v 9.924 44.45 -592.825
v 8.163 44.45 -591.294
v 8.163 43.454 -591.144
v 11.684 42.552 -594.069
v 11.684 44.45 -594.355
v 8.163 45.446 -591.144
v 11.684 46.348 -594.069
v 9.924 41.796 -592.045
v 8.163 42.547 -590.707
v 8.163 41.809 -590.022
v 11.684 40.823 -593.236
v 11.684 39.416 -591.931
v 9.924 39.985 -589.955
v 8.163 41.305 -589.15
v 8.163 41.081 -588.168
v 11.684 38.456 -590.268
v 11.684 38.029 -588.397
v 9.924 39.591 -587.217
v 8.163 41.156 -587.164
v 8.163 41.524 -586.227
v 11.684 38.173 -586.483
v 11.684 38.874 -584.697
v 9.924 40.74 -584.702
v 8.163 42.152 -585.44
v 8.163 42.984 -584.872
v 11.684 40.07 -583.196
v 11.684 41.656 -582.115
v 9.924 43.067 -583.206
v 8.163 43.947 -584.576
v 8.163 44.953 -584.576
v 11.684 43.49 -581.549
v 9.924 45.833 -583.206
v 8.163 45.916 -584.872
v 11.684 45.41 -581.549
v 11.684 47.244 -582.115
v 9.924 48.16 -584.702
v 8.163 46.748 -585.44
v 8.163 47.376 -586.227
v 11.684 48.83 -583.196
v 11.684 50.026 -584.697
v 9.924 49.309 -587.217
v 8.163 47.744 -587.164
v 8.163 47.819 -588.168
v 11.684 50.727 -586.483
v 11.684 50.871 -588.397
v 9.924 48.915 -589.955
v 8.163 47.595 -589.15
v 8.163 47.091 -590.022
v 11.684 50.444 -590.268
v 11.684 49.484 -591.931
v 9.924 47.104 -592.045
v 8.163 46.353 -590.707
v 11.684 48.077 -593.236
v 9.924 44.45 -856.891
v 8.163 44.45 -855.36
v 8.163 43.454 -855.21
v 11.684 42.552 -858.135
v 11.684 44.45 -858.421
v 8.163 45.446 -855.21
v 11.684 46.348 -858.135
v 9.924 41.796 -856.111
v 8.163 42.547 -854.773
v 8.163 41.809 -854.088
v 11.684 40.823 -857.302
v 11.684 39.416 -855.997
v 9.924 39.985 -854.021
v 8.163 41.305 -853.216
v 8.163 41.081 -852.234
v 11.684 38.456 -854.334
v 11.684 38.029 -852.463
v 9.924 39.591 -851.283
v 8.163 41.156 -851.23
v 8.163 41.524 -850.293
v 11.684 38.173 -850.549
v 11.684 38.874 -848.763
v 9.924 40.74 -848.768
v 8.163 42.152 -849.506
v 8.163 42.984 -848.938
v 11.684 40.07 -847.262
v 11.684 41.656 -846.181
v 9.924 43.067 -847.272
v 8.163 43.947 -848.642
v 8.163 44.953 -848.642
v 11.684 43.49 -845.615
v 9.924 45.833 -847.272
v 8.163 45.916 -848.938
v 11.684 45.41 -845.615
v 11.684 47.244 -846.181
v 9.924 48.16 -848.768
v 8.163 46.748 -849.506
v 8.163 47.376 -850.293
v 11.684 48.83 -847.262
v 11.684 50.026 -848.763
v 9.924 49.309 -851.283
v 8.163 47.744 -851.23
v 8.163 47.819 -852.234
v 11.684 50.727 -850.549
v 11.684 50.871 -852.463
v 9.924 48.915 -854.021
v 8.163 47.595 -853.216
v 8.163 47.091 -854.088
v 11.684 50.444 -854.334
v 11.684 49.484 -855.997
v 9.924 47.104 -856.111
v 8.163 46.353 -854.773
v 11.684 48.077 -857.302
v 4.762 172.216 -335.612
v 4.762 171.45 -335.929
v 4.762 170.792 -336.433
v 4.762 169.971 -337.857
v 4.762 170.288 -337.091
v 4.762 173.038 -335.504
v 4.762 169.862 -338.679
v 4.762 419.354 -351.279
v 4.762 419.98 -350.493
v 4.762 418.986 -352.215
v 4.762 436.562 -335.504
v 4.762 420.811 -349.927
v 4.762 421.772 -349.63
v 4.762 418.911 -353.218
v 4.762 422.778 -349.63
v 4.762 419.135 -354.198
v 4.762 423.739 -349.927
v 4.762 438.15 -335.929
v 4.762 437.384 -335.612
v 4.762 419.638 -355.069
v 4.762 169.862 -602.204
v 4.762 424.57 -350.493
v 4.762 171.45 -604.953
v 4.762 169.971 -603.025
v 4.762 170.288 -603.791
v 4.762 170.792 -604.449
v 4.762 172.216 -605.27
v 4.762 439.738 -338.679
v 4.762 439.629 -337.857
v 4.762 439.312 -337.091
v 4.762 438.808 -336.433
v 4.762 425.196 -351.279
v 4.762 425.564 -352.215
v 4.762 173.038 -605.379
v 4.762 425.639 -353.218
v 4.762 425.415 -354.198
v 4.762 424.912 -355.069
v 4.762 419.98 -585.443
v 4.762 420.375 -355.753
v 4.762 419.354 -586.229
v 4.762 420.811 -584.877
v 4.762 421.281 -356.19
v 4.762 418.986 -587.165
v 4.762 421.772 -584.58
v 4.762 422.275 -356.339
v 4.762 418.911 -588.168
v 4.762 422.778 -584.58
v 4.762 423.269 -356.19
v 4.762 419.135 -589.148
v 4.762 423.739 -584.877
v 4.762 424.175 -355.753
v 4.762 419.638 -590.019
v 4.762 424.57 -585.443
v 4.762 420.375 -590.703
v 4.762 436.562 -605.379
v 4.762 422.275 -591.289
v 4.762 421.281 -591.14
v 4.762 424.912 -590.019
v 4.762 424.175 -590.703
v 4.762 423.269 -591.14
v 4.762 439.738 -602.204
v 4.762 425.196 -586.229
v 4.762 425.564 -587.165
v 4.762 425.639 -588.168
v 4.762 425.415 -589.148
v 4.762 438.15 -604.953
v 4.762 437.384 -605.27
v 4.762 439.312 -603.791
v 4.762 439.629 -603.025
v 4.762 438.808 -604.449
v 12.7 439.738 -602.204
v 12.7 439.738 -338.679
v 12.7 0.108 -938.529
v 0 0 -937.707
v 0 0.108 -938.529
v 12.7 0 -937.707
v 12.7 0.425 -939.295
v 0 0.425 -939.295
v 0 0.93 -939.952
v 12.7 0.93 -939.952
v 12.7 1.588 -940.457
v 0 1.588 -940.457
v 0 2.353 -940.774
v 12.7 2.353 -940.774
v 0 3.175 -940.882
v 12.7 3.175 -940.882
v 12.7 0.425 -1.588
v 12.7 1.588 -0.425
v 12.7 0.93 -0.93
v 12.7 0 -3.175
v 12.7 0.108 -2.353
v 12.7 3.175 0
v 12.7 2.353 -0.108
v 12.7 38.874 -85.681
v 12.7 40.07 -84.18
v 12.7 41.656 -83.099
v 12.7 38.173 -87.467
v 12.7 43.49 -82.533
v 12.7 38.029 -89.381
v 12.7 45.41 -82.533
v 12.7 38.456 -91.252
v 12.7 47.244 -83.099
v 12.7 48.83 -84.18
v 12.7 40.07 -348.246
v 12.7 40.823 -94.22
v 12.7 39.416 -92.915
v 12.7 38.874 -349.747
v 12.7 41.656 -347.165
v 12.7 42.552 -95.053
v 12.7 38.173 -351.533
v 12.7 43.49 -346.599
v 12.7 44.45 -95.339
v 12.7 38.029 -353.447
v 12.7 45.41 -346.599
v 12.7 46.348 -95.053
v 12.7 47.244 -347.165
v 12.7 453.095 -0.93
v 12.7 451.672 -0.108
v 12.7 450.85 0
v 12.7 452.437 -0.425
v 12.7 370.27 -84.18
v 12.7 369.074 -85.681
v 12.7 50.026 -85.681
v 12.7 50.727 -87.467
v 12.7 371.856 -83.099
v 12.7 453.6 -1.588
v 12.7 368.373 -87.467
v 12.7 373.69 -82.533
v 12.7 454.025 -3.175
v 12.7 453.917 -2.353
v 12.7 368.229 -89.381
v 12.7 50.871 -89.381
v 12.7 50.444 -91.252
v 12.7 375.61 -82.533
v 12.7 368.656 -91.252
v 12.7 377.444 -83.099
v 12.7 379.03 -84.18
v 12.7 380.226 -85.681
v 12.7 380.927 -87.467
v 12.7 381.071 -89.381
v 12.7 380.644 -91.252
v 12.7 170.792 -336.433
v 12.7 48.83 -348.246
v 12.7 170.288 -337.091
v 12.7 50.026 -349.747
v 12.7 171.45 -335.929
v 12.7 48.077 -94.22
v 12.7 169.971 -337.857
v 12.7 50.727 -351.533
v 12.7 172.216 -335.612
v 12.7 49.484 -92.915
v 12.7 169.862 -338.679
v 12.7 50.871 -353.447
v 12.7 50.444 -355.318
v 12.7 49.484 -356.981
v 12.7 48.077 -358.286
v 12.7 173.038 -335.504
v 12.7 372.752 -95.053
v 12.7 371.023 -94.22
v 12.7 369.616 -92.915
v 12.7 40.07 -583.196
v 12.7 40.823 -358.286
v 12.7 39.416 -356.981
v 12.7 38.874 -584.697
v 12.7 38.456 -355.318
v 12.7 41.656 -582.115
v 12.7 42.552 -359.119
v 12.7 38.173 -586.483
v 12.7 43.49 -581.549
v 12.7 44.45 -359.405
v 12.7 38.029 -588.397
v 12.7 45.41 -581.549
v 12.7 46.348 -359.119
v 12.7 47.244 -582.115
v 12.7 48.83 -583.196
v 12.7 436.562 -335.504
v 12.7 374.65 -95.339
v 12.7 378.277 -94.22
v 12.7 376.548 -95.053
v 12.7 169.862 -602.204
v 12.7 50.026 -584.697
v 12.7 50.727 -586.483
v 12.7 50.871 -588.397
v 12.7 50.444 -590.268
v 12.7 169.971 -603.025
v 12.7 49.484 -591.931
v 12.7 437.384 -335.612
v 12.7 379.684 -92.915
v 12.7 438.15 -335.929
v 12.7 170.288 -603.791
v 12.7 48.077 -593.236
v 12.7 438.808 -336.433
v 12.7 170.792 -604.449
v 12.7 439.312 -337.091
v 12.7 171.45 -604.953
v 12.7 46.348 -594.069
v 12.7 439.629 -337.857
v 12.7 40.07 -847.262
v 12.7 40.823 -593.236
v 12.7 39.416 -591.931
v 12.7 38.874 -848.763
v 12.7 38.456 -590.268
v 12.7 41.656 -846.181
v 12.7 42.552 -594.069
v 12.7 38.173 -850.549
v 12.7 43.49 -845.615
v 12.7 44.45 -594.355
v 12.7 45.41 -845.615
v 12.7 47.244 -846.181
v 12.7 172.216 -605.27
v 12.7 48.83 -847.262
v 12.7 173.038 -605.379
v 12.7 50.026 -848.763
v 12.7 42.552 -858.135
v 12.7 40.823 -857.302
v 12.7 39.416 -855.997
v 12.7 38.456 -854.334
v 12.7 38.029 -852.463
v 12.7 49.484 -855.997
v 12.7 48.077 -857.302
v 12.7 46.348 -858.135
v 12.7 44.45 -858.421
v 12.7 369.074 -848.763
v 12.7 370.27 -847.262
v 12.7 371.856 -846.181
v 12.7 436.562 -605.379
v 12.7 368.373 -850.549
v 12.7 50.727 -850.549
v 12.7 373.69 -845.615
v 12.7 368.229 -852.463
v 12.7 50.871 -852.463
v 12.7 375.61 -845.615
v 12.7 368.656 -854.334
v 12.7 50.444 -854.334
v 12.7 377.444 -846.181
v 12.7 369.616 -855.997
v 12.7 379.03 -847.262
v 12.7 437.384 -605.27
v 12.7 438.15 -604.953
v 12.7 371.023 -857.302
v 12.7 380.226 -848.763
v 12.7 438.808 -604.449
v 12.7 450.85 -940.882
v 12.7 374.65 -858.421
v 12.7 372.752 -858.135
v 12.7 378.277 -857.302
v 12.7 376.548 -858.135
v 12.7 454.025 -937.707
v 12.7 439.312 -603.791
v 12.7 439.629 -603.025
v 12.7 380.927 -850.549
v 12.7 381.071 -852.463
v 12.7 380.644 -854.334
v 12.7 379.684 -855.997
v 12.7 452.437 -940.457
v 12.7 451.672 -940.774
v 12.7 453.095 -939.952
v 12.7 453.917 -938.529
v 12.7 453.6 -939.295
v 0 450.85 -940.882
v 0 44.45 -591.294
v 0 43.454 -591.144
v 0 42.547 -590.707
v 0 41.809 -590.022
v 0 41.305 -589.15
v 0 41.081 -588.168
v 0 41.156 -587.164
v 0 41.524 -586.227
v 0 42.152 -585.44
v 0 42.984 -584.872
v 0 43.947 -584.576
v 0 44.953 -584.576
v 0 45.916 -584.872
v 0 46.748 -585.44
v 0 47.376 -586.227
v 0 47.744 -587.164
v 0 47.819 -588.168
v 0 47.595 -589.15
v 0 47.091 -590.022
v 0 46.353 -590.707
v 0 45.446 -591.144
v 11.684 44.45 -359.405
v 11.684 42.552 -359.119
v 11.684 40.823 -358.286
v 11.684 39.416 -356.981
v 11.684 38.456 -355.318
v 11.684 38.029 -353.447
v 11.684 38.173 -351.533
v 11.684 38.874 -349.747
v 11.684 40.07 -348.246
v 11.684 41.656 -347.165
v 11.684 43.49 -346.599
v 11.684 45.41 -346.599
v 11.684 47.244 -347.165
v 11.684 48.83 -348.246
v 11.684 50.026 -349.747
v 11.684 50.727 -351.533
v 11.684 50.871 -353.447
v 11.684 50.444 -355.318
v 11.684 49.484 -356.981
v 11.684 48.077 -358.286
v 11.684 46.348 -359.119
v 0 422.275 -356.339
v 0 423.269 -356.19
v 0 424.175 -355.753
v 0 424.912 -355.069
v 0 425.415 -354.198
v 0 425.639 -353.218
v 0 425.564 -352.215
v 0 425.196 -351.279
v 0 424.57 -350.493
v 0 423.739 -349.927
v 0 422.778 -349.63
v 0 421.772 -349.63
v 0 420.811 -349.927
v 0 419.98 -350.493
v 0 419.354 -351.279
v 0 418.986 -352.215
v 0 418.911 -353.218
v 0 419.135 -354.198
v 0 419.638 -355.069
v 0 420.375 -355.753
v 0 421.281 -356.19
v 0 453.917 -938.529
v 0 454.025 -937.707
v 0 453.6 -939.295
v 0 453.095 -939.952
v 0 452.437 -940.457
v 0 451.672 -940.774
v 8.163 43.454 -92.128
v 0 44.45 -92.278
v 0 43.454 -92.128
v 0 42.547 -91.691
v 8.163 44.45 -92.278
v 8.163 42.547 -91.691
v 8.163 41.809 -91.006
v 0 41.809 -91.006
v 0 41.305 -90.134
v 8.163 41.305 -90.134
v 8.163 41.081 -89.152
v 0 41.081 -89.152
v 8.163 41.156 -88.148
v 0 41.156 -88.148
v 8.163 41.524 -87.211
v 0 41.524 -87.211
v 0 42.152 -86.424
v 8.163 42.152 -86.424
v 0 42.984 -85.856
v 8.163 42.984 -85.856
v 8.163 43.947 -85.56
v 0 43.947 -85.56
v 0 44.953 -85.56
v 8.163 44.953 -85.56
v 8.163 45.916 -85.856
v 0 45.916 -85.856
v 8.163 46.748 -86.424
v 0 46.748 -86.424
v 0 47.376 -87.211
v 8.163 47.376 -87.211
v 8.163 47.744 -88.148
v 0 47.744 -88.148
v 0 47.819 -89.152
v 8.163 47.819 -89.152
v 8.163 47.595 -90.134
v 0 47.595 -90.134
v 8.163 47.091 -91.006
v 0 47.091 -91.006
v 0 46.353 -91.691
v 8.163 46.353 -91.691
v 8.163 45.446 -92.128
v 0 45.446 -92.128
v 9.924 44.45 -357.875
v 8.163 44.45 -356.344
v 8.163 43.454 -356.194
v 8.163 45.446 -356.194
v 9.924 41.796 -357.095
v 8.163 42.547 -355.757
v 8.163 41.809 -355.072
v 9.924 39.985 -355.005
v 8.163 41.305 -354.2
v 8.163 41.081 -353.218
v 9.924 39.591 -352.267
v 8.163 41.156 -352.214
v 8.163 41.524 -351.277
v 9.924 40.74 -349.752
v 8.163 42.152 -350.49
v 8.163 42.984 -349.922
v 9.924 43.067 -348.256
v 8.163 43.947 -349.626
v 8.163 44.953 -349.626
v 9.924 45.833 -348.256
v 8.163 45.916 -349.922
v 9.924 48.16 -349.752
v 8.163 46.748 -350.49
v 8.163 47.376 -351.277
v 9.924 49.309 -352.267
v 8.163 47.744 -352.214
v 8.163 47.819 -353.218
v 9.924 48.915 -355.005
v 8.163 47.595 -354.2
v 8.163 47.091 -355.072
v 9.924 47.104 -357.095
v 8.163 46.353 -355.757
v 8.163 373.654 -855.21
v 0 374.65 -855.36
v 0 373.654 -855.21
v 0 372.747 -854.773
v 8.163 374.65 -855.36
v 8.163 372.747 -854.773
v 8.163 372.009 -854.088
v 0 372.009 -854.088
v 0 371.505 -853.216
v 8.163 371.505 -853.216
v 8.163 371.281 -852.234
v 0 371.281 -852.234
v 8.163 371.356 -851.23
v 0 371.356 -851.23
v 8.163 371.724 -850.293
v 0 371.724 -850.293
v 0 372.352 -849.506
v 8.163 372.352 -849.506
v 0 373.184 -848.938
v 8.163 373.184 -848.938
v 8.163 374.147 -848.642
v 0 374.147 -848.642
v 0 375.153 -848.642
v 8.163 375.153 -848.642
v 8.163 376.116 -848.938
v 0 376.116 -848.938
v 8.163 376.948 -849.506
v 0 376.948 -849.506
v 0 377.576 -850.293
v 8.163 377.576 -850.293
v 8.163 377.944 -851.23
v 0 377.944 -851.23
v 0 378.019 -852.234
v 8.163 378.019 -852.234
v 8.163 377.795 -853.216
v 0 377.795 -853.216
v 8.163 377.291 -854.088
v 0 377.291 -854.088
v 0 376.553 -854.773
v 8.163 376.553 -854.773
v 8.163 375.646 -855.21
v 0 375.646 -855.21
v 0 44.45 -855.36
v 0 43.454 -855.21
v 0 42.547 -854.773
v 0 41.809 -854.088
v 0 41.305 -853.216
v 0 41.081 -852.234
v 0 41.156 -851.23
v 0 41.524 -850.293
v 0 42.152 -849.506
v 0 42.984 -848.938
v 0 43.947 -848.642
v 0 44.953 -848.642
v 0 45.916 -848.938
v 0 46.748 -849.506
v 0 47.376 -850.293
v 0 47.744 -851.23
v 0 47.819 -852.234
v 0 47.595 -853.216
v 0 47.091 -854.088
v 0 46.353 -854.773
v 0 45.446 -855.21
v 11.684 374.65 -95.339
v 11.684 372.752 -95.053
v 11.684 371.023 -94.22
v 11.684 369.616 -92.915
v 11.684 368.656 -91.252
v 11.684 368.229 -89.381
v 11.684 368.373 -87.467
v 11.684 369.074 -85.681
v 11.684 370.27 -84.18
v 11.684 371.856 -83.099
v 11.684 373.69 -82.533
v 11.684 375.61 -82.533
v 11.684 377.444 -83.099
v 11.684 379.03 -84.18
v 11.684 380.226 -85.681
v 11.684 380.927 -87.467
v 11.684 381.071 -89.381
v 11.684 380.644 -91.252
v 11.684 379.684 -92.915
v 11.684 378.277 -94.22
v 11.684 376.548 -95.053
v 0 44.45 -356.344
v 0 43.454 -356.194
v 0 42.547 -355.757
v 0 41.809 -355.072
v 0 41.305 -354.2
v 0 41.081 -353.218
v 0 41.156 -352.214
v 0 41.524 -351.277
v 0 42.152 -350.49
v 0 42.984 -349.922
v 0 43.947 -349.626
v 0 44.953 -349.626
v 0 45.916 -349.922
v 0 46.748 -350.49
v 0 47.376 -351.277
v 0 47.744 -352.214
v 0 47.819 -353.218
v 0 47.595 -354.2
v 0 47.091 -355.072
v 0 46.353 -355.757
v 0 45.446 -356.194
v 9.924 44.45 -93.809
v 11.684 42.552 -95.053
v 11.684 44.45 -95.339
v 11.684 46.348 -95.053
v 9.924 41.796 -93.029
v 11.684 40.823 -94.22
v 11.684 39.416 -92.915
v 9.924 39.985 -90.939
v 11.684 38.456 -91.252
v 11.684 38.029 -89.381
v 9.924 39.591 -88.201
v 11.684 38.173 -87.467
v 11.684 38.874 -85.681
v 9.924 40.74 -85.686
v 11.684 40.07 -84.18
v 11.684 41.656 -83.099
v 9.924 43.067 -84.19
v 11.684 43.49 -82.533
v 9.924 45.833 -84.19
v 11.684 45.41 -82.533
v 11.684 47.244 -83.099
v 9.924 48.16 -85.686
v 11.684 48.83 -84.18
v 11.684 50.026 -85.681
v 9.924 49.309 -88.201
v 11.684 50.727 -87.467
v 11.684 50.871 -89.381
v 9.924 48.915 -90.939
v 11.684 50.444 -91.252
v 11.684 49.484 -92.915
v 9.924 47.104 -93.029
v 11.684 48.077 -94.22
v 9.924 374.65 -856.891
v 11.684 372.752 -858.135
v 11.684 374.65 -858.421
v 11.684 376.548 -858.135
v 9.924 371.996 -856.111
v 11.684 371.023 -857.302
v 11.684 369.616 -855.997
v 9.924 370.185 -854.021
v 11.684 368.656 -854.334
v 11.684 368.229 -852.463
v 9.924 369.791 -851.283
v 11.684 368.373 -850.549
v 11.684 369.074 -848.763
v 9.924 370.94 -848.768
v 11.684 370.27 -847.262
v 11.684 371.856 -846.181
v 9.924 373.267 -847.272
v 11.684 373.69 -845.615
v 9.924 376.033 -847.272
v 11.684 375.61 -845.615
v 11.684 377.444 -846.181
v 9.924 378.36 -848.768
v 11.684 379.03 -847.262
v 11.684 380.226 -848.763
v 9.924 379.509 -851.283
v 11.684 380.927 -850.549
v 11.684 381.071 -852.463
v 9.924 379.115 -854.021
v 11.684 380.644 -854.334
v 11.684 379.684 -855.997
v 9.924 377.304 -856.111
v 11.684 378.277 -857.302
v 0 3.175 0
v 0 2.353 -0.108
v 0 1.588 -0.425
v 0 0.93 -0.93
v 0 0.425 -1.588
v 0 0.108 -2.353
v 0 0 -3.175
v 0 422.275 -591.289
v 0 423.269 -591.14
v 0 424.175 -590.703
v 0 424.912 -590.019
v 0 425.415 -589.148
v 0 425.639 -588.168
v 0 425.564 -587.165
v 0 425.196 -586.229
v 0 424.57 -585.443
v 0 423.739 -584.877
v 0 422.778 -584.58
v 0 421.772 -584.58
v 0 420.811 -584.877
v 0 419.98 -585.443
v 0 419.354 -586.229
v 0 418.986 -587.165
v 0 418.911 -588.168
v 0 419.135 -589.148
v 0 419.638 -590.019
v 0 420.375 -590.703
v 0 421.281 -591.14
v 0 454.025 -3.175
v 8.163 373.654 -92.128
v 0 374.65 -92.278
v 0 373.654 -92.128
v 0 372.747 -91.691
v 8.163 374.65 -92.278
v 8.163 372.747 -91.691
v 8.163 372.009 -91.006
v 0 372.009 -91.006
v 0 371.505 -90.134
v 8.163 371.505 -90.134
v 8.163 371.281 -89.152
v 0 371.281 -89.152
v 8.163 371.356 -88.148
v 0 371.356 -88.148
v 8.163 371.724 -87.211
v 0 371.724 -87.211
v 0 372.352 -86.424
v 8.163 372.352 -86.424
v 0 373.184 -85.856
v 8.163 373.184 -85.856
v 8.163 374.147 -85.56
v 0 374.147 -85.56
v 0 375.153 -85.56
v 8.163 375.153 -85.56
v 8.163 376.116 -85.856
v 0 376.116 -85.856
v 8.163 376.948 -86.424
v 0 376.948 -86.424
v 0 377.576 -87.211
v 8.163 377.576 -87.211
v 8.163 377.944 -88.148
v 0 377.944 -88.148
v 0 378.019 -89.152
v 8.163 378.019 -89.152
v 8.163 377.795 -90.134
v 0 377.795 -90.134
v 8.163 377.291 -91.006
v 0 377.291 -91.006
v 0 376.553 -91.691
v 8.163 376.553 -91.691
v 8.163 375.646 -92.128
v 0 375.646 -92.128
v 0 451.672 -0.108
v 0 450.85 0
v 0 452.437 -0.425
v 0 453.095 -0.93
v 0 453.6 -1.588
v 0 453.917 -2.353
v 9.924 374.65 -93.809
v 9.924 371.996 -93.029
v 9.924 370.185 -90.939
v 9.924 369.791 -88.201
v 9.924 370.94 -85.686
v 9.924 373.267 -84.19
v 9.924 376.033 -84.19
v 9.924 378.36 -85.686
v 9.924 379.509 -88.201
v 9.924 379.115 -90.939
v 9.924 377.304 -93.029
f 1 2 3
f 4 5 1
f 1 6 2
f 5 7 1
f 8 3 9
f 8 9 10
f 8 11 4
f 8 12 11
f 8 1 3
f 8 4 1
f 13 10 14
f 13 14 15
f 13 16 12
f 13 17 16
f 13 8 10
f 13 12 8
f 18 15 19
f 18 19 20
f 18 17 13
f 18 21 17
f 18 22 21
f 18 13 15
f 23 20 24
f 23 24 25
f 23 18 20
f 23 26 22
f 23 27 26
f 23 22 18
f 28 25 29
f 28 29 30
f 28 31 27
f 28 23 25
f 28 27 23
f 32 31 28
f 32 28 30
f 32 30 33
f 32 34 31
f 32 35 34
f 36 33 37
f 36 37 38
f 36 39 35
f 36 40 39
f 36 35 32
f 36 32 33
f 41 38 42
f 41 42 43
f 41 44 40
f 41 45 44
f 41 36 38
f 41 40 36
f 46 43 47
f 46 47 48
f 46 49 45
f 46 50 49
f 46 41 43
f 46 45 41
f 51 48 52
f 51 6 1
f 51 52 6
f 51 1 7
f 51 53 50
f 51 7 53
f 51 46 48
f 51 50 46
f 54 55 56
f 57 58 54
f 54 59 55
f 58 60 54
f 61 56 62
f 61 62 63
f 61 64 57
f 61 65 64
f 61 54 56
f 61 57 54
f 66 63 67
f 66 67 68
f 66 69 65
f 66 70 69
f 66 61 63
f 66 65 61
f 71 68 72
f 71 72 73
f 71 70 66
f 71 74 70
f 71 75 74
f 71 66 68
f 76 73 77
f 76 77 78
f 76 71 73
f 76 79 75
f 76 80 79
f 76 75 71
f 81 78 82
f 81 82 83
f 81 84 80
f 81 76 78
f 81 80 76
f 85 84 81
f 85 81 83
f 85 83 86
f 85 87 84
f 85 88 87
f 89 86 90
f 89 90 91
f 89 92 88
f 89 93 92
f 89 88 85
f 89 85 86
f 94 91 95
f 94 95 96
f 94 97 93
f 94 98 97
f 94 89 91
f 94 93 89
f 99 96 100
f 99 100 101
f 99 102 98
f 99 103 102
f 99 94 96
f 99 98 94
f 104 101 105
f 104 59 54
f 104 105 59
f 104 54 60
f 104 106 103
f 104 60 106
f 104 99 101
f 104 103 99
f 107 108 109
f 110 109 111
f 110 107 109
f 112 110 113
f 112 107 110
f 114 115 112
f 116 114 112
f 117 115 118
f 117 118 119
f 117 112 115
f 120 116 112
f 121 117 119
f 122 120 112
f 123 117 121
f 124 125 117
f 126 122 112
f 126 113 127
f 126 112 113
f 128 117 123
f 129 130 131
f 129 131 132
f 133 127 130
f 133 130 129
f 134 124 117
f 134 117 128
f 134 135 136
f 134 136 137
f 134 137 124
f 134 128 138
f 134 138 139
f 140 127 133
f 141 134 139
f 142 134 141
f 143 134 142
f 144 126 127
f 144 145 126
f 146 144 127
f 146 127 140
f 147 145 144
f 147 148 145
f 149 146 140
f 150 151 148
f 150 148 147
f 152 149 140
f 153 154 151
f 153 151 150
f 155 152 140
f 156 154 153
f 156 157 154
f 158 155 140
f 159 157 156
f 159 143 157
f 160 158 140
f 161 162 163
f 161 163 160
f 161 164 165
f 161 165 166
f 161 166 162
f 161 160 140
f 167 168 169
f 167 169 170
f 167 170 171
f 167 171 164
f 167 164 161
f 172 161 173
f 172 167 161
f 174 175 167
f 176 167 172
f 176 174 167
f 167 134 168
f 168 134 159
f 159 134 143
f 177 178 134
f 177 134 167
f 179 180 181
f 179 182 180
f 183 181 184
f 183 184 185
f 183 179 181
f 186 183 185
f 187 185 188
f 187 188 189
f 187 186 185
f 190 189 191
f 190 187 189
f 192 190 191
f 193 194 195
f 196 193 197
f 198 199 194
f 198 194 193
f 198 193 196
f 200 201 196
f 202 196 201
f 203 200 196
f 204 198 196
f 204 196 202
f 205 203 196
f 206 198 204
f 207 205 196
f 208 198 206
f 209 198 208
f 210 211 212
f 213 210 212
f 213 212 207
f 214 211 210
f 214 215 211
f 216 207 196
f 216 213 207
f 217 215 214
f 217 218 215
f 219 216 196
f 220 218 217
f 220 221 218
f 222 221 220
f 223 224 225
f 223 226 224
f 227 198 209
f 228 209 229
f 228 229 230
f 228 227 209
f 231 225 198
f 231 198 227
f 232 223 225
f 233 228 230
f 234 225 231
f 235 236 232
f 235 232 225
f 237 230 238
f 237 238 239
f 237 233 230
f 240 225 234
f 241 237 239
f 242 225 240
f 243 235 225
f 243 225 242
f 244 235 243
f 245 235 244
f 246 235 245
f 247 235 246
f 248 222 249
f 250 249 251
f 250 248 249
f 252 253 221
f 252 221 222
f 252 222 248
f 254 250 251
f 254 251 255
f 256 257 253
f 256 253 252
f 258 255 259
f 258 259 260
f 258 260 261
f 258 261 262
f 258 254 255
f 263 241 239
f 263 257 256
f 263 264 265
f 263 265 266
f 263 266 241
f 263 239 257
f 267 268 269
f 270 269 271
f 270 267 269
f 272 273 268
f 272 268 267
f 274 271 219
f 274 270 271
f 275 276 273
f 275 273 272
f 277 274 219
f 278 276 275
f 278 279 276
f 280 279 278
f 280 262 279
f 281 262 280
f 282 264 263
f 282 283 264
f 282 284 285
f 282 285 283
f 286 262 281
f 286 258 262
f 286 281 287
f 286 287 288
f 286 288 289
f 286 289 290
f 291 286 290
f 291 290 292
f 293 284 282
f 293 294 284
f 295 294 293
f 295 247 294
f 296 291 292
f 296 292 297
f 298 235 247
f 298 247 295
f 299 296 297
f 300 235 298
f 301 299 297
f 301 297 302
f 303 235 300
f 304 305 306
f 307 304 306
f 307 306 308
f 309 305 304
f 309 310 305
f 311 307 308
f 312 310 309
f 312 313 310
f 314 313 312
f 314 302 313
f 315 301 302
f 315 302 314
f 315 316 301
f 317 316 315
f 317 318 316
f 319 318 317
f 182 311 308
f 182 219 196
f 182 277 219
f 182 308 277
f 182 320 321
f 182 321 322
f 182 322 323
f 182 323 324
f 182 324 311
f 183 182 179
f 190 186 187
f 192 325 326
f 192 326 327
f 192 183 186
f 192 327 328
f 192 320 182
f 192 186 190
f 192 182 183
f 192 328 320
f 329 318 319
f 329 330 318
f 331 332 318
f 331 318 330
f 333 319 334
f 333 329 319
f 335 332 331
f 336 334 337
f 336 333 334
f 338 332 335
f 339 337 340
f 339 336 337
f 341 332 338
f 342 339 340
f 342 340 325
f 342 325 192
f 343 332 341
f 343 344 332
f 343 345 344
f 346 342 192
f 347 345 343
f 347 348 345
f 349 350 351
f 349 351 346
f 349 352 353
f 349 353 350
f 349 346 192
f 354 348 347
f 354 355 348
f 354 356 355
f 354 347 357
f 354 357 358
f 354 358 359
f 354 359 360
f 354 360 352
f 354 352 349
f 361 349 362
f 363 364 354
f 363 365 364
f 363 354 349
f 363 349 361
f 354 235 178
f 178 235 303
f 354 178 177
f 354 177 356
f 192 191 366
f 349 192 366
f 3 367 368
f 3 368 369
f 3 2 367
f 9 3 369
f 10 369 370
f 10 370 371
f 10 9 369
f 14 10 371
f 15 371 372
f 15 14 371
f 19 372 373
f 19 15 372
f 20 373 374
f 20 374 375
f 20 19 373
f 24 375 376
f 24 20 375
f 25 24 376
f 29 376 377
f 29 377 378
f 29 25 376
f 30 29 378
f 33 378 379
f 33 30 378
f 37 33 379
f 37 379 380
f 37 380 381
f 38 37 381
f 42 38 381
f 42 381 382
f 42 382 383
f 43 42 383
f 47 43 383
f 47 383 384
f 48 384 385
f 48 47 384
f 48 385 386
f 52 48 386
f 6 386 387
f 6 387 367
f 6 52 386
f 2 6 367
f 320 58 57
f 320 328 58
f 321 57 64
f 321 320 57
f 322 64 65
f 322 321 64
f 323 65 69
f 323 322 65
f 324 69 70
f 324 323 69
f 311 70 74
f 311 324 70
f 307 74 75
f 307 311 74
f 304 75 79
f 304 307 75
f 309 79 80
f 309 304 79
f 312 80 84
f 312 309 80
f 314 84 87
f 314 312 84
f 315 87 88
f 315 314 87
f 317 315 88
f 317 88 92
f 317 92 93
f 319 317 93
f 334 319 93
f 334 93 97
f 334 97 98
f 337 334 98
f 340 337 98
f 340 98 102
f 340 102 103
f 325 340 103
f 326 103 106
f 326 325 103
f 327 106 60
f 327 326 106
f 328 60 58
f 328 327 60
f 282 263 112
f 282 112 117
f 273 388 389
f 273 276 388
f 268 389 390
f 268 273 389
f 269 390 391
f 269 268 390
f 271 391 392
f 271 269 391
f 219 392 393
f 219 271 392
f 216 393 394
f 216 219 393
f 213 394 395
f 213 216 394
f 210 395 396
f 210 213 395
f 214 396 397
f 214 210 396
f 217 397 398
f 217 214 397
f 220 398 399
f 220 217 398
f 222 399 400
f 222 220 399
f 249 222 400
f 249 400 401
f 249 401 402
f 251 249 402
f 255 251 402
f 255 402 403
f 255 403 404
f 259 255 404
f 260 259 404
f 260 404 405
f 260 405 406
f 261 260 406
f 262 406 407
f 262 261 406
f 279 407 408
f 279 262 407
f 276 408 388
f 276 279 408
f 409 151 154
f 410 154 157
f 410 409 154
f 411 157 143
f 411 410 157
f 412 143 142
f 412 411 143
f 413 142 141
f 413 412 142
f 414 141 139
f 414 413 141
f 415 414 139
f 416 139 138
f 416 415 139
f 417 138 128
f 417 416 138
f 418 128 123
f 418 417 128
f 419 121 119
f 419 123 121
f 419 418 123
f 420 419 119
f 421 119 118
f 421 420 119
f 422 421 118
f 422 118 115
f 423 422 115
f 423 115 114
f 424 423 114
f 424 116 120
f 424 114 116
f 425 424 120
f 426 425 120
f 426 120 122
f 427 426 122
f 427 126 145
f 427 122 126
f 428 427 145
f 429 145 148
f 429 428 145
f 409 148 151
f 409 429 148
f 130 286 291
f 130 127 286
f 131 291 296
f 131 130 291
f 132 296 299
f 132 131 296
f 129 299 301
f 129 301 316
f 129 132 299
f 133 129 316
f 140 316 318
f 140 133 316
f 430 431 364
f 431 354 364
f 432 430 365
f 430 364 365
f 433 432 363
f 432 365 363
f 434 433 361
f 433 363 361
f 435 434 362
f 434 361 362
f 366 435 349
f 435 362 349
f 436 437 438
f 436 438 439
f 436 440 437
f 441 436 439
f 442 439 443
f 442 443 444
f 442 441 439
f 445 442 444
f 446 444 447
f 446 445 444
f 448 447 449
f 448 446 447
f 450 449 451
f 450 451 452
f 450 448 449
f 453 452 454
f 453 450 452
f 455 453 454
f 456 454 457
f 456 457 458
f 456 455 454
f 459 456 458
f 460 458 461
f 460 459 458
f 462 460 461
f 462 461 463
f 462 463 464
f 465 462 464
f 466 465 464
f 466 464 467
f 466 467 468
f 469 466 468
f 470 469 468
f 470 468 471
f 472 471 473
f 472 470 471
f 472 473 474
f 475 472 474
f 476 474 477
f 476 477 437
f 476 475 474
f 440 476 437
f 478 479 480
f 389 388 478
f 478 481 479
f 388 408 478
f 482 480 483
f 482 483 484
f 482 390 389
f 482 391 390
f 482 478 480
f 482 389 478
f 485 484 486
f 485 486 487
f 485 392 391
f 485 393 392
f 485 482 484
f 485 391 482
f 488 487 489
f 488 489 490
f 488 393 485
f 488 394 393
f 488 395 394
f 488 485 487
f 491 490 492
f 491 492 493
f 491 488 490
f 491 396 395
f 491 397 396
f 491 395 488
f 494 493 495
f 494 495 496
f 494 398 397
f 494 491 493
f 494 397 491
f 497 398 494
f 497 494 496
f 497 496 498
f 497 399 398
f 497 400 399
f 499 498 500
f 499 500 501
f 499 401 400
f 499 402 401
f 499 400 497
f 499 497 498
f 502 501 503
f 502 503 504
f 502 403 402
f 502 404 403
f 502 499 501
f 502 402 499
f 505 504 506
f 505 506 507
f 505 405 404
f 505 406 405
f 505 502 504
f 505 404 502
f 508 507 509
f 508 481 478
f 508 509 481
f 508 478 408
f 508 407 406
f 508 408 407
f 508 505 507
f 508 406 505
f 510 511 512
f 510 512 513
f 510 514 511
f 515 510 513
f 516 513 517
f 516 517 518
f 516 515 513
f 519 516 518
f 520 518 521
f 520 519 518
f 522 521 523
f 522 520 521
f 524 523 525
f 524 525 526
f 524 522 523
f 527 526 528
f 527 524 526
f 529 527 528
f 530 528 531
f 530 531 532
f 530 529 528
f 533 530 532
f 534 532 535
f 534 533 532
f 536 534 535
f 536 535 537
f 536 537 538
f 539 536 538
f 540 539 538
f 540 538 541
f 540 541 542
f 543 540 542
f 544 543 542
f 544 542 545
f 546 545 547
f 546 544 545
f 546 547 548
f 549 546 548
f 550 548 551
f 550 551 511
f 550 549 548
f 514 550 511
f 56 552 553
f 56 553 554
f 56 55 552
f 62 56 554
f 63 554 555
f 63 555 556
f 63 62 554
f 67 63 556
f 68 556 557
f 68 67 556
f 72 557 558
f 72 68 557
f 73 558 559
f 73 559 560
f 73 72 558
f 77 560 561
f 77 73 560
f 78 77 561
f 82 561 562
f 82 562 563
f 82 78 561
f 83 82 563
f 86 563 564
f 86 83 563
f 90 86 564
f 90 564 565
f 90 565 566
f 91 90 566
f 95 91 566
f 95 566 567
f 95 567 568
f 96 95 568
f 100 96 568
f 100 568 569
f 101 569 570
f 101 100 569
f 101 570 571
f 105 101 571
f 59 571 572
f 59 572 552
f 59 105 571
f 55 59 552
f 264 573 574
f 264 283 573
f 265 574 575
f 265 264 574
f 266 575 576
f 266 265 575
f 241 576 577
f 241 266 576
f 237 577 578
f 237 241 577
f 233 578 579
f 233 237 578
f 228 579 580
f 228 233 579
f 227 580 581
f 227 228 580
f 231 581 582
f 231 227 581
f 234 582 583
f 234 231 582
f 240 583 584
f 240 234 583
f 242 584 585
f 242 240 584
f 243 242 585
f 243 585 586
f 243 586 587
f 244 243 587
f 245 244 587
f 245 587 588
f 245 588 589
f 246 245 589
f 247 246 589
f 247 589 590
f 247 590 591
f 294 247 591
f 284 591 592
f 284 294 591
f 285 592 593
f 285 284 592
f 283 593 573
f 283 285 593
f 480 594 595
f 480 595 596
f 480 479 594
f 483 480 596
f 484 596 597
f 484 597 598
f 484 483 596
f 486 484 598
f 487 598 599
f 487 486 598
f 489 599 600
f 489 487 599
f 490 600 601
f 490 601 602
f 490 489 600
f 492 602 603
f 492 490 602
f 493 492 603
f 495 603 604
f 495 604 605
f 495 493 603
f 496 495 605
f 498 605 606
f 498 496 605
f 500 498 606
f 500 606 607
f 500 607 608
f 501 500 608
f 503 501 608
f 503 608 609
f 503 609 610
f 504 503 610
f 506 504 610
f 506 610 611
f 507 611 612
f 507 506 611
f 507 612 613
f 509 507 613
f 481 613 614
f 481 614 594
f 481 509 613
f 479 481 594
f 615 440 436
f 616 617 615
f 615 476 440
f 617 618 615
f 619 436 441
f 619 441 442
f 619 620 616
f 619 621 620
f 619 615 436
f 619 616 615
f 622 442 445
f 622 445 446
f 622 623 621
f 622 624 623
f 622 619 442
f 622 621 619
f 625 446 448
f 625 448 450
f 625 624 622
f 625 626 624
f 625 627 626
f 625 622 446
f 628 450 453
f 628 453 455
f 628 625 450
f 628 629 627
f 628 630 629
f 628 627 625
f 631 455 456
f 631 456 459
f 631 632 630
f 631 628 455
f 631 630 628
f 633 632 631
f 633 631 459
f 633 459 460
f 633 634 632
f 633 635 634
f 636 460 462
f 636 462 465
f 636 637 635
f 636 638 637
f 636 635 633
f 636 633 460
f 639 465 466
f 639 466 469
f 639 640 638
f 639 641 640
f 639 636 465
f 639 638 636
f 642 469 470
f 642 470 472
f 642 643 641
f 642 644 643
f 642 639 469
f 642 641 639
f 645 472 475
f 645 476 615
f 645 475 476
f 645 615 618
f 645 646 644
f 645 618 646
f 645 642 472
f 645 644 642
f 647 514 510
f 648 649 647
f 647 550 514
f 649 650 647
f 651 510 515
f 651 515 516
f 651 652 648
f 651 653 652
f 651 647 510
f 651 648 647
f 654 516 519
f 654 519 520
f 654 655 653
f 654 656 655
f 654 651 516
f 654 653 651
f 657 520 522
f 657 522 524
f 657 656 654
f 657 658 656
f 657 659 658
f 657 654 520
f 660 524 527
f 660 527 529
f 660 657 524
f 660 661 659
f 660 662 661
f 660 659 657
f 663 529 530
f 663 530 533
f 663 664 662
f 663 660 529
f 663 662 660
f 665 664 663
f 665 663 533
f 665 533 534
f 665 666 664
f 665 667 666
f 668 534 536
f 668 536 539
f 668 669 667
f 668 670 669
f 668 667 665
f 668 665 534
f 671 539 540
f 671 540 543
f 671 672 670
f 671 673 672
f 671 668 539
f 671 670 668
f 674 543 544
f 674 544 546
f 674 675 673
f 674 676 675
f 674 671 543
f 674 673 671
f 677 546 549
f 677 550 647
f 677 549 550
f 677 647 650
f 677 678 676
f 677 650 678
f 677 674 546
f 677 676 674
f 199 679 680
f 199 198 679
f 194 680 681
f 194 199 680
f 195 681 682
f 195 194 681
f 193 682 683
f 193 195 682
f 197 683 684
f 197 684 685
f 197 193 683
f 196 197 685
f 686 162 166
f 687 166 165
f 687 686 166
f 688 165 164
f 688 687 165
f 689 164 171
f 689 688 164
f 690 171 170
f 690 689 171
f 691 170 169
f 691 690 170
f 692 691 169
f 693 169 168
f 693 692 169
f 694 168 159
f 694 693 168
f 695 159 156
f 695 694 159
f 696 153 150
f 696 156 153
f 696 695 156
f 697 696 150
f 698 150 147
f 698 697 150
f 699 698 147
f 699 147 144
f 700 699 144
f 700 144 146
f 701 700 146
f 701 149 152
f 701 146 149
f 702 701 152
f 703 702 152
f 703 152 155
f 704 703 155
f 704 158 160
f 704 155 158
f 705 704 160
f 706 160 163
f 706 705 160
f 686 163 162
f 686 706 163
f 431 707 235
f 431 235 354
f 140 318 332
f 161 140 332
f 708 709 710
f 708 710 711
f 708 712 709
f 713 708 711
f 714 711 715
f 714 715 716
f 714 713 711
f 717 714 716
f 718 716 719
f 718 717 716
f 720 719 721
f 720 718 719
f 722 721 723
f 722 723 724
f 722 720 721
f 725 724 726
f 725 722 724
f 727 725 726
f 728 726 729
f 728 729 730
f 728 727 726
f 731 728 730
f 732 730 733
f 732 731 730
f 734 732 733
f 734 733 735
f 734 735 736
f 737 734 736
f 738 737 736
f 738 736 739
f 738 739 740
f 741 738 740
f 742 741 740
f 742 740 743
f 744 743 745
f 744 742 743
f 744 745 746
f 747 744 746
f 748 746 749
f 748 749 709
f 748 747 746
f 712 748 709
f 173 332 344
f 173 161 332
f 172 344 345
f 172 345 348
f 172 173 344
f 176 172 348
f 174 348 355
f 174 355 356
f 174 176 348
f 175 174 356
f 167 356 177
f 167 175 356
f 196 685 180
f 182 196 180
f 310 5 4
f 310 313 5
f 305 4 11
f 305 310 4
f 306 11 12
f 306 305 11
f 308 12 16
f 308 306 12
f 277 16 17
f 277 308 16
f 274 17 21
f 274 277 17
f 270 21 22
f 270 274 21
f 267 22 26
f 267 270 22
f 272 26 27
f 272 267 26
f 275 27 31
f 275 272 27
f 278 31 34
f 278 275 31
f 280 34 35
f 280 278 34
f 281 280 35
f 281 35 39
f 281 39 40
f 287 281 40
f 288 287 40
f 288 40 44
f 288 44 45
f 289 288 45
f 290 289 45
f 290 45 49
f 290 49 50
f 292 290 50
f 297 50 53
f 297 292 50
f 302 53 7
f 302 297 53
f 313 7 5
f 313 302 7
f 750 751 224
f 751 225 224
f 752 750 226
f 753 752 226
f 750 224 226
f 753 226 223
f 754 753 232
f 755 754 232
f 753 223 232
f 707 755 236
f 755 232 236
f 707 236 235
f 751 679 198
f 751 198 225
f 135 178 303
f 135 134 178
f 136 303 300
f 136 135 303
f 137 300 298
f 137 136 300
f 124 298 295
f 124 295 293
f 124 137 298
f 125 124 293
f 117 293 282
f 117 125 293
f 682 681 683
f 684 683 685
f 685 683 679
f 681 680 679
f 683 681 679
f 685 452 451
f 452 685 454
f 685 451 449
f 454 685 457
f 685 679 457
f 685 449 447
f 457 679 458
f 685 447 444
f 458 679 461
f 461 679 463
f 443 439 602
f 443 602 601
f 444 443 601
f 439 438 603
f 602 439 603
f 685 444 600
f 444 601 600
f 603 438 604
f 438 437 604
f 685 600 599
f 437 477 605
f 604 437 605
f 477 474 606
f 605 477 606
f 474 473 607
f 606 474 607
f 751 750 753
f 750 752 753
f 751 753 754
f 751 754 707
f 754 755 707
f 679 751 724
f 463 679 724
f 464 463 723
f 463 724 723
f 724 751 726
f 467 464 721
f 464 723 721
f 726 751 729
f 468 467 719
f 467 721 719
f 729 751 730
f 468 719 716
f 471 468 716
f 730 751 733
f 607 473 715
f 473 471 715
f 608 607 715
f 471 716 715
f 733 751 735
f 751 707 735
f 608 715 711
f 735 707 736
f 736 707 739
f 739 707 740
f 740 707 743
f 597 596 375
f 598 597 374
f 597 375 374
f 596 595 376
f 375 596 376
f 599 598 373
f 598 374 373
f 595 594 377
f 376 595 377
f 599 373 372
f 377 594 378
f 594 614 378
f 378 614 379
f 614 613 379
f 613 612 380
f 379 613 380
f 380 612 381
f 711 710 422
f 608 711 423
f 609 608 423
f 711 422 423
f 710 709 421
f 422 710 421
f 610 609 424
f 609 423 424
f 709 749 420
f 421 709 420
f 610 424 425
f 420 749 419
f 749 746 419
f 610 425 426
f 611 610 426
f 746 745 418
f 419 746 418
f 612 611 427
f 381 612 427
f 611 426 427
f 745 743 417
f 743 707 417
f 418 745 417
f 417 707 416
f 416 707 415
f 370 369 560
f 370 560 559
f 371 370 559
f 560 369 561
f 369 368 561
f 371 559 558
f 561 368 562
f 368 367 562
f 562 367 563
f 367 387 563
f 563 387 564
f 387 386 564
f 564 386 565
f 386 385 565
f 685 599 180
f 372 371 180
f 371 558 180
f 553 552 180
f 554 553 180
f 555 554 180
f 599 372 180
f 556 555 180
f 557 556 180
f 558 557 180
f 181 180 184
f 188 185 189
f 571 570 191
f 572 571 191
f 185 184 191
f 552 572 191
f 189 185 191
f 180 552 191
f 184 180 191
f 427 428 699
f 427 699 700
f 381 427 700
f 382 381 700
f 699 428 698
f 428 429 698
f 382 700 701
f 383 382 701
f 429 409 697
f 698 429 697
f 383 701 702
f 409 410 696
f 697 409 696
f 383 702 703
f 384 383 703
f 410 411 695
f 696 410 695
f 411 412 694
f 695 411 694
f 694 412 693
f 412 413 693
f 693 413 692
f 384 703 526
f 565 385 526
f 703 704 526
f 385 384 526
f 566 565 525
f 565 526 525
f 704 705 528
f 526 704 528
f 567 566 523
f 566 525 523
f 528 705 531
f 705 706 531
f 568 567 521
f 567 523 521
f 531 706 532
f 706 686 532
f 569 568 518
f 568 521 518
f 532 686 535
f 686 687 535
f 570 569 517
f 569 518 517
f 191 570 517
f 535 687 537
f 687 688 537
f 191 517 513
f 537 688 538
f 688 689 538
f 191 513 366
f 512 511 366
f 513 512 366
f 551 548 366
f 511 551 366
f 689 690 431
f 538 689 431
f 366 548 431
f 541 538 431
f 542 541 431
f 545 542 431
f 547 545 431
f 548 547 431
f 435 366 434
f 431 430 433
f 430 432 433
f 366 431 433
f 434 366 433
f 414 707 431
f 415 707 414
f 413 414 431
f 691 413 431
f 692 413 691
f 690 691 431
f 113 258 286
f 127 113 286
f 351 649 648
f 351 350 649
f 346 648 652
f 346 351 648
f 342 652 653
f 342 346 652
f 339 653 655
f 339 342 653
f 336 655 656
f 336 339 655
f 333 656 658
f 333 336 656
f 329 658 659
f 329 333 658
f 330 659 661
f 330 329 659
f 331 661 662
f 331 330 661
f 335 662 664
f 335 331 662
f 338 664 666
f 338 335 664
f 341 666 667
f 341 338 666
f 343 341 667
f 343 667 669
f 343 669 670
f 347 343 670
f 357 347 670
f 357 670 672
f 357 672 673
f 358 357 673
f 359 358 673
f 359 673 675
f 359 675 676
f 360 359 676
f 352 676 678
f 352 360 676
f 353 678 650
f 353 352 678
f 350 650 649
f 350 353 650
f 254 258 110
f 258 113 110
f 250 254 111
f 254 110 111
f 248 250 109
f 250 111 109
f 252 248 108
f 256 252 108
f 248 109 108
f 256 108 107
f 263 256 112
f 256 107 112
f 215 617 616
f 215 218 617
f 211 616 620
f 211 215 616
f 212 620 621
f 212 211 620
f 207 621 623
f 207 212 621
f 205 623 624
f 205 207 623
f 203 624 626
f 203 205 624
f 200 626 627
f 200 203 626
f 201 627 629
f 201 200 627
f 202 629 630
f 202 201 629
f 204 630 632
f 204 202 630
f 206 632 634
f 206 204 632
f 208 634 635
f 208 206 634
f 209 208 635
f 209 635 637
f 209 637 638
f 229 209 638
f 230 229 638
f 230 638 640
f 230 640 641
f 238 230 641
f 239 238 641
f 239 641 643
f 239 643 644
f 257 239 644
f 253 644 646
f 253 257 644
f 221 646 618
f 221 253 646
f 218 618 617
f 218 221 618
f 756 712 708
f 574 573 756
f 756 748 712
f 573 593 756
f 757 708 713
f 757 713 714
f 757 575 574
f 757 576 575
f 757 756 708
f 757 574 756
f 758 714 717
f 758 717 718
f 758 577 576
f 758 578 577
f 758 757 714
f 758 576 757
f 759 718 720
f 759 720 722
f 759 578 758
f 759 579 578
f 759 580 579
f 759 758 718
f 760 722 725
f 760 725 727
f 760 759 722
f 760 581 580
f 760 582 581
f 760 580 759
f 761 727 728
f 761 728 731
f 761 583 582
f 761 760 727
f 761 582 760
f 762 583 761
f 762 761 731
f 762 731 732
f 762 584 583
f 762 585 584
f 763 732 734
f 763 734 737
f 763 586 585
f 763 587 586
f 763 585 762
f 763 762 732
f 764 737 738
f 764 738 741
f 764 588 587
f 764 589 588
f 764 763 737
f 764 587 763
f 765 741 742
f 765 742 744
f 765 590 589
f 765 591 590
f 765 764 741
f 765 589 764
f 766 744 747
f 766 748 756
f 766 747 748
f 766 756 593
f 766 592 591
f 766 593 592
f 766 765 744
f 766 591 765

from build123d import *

# Parameters (mm, degrees)
SKETCH1_W                                     = 940.88204
SKETCH1_H                                     = 454.025
SKETCH1_R                                     = 3.3734375
BOSS_EXTRUDE1_DEPTH                           = 12.7
FILLET1_R                                     = 3.175
SKETCH2_W                                     = 269.875
SKETCH2_H                                     = 269.875
CUT_EXTRUDE1_DEPTH                            = 7.9375
FILLET2_R                                     = 3.175
CSK_FOR_1_4_FLAT_HEAD_MACHINE_SCREW1_AT_COUNT = 2
CSK_FOR_1_4_FLAT_HEAD_MACHINE_SCREW1_AT_PITCH = 763.08204
CSK_FOR_1_4_FLAT_HEAD_MACHINE_SCREW1_2_COUNT  = 2
CSK_FOR_1_4_FLAT_HEAD_MACHINE_SCREW1_2_PITCH  = 330.2
CSK_FOR_1_4_FLAT_HEAD_MACHINE_SCREW1_3_COUNT  = 2
CSK_FOR_1_4_FLAT_HEAD_MACHINE_SCREW1_3_PITCH  = 422.803622168
CSK_FOR_1_4_FLAT_HEAD_MACHINE_SCREW1_4_COUNT  = 2
CSK_FOR_1_4_FLAT_HEAD_MACHINE_SCREW1_4_PITCH  = 598.371981477
CSK_FOR_1_4_FLAT_HEAD_MACHINE_SCREW1_5_COUNT  = 2
CSK_FOR_1_4_FLAT_HEAD_MACHINE_SCREW1_5_PITCH  = 831.460305589


with BuildPart() as part:
    # Sketch1 → Boss-Extrude1 (new body)
    with BuildSketch(Plane(origin=(0, 0, 0), x_dir=(0, 0, -1), z_dir=(1, 0, 0))):
        with Locations((470.44102, 227.0125)):
            Rectangle(SKETCH1_W, SKETCH1_H)
        with Locations((352.96602, 422.275)):
            Circle(SKETCH1_R, mode=Mode.SUBTRACT)
        with Locations((587.91602, 422.275)):
            Circle(SKETCH1_R, mode=Mode.SUBTRACT)
    extrude(amount=BOSS_EXTRUDE1_DEPTH)

    # Fillet1
    fillet1_edges = [part.edges().sort_by_distance(p)[0] for p in [
        (6.35, 454.025, 0),
        (6.35, 454.025, -940.88204),
        (6.35, 0, -940.88204),
        (6.35, 0, 0),
    ]]
    fillet(fillet1_edges, radius=FILLET1_R)

    # Sketch2 → Cut-Extrude1 (cut)
    with BuildSketch(Plane(origin=(12.7, 0, 0), x_dir=(0, 0, -1), z_dir=(1, 0, 0))):
        with Locations((470.44102, 304.8)):
            Rectangle(SKETCH2_W, SKETCH2_H)
    extrude(amount=-CUT_EXTRUDE1_DEPTH, mode=Mode.SUBTRACT)

    # Fillet2
    fillet2_edges = [part.edges().sort_by_distance(p)[0] for p in [
        (8.73125, 169.8625, -335.50352),
        (8.73125, 439.7375, -335.50352),
        (8.73125, 439.7375, -605.37852),
        (8.73125, 169.8625, -605.37852),
    ]]
    fillet(fillet2_edges, radius=FILLET2_R)

    # Sketch5 → CSK for 1/4 Flat Head Machine Screw1 (revolve, cut)
    with BuildSketch(Plane(origin=(12.7, 374.65, -88.9), x_dir=(0, 0, -1), z_dir=(0, 1, 0))):
        Polygon((0, 0), (0, 12.7), (3.3782, 12.7), (3.3782, 4.536932584), (6.4389, 1.016), (6.4389, 0), align=None)
    csk_for_1_4_flat_head_machine_screw1 = revolve(axis=Axis((19.05, 374.65, -88.9), (-1, 0, 0)), mode=Mode.SUBTRACT)

    # CSK for 1/4 Flat Head Machine Screw1 at: CSK for 1/4 Flat Head Machine Screw1 ×2
    with Locations(*[(0, 0, -i * CSK_FOR_1_4_FLAT_HEAD_MACHINE_SCREW1_AT_PITCH) for i in range(1, CSK_FOR_1_4_FLAT_HEAD_MACHINE_SCREW1_AT_COUNT)]):
        add(csk_for_1_4_flat_head_machine_screw1, mode=Mode.SUBTRACT)

    # CSK for 1_4 Flat Head Machine Screw1 2: CSK for 1/4 Flat Head Machine Screw1 ×2
    with Locations(*[(0, -i * CSK_FOR_1_4_FLAT_HEAD_MACHINE_SCREW1_2_PITCH, 0) for i in range(1, CSK_FOR_1_4_FLAT_HEAD_MACHINE_SCREW1_2_COUNT)]):
        add(csk_for_1_4_flat_head_machine_screw1, mode=Mode.SUBTRACT)

    # CSK for 1_4 Flat Head Machine Screw1 3: CSK for 1/4 Flat Head Machine Screw1 ×2
    with Locations(*[Vector(0, -0.780977226, -0.624559503) * (i * CSK_FOR_1_4_FLAT_HEAD_MACHINE_SCREW1_3_PITCH) for i in range(1, CSK_FOR_1_4_FLAT_HEAD_MACHINE_SCREW1_3_COUNT)]):
        add(csk_for_1_4_flat_head_machine_screw1, mode=Mode.SUBTRACT)

    # CSK for 1_4 Flat Head Machine Screw1 4: CSK for 1/4 Flat Head Machine Screw1 ×2
    with Locations(*[Vector(0, -0.551830651, -0.833956194) * (i * CSK_FOR_1_4_FLAT_HEAD_MACHINE_SCREW1_4_PITCH) for i in range(1, CSK_FOR_1_4_FLAT_HEAD_MACHINE_SCREW1_4_COUNT)]):
        add(csk_for_1_4_flat_head_machine_screw1, mode=Mode.SUBTRACT)

    # CSK for 1_4 Flat Head Machine Screw1 5: CSK for 1/4 Flat Head Machine Screw1 ×2
    with Locations(*[Vector(0, -0.397132608, -0.917761239) * (i * CSK_FOR_1_4_FLAT_HEAD_MACHINE_SCREW1_5_PITCH) for i in range(1, CSK_FOR_1_4_FLAT_HEAD_MACHINE_SCREW1_5_COUNT)]):
        add(csk_for_1_4_flat_head_machine_screw1, mode=Mode.SUBTRACT)


solid = part.part
